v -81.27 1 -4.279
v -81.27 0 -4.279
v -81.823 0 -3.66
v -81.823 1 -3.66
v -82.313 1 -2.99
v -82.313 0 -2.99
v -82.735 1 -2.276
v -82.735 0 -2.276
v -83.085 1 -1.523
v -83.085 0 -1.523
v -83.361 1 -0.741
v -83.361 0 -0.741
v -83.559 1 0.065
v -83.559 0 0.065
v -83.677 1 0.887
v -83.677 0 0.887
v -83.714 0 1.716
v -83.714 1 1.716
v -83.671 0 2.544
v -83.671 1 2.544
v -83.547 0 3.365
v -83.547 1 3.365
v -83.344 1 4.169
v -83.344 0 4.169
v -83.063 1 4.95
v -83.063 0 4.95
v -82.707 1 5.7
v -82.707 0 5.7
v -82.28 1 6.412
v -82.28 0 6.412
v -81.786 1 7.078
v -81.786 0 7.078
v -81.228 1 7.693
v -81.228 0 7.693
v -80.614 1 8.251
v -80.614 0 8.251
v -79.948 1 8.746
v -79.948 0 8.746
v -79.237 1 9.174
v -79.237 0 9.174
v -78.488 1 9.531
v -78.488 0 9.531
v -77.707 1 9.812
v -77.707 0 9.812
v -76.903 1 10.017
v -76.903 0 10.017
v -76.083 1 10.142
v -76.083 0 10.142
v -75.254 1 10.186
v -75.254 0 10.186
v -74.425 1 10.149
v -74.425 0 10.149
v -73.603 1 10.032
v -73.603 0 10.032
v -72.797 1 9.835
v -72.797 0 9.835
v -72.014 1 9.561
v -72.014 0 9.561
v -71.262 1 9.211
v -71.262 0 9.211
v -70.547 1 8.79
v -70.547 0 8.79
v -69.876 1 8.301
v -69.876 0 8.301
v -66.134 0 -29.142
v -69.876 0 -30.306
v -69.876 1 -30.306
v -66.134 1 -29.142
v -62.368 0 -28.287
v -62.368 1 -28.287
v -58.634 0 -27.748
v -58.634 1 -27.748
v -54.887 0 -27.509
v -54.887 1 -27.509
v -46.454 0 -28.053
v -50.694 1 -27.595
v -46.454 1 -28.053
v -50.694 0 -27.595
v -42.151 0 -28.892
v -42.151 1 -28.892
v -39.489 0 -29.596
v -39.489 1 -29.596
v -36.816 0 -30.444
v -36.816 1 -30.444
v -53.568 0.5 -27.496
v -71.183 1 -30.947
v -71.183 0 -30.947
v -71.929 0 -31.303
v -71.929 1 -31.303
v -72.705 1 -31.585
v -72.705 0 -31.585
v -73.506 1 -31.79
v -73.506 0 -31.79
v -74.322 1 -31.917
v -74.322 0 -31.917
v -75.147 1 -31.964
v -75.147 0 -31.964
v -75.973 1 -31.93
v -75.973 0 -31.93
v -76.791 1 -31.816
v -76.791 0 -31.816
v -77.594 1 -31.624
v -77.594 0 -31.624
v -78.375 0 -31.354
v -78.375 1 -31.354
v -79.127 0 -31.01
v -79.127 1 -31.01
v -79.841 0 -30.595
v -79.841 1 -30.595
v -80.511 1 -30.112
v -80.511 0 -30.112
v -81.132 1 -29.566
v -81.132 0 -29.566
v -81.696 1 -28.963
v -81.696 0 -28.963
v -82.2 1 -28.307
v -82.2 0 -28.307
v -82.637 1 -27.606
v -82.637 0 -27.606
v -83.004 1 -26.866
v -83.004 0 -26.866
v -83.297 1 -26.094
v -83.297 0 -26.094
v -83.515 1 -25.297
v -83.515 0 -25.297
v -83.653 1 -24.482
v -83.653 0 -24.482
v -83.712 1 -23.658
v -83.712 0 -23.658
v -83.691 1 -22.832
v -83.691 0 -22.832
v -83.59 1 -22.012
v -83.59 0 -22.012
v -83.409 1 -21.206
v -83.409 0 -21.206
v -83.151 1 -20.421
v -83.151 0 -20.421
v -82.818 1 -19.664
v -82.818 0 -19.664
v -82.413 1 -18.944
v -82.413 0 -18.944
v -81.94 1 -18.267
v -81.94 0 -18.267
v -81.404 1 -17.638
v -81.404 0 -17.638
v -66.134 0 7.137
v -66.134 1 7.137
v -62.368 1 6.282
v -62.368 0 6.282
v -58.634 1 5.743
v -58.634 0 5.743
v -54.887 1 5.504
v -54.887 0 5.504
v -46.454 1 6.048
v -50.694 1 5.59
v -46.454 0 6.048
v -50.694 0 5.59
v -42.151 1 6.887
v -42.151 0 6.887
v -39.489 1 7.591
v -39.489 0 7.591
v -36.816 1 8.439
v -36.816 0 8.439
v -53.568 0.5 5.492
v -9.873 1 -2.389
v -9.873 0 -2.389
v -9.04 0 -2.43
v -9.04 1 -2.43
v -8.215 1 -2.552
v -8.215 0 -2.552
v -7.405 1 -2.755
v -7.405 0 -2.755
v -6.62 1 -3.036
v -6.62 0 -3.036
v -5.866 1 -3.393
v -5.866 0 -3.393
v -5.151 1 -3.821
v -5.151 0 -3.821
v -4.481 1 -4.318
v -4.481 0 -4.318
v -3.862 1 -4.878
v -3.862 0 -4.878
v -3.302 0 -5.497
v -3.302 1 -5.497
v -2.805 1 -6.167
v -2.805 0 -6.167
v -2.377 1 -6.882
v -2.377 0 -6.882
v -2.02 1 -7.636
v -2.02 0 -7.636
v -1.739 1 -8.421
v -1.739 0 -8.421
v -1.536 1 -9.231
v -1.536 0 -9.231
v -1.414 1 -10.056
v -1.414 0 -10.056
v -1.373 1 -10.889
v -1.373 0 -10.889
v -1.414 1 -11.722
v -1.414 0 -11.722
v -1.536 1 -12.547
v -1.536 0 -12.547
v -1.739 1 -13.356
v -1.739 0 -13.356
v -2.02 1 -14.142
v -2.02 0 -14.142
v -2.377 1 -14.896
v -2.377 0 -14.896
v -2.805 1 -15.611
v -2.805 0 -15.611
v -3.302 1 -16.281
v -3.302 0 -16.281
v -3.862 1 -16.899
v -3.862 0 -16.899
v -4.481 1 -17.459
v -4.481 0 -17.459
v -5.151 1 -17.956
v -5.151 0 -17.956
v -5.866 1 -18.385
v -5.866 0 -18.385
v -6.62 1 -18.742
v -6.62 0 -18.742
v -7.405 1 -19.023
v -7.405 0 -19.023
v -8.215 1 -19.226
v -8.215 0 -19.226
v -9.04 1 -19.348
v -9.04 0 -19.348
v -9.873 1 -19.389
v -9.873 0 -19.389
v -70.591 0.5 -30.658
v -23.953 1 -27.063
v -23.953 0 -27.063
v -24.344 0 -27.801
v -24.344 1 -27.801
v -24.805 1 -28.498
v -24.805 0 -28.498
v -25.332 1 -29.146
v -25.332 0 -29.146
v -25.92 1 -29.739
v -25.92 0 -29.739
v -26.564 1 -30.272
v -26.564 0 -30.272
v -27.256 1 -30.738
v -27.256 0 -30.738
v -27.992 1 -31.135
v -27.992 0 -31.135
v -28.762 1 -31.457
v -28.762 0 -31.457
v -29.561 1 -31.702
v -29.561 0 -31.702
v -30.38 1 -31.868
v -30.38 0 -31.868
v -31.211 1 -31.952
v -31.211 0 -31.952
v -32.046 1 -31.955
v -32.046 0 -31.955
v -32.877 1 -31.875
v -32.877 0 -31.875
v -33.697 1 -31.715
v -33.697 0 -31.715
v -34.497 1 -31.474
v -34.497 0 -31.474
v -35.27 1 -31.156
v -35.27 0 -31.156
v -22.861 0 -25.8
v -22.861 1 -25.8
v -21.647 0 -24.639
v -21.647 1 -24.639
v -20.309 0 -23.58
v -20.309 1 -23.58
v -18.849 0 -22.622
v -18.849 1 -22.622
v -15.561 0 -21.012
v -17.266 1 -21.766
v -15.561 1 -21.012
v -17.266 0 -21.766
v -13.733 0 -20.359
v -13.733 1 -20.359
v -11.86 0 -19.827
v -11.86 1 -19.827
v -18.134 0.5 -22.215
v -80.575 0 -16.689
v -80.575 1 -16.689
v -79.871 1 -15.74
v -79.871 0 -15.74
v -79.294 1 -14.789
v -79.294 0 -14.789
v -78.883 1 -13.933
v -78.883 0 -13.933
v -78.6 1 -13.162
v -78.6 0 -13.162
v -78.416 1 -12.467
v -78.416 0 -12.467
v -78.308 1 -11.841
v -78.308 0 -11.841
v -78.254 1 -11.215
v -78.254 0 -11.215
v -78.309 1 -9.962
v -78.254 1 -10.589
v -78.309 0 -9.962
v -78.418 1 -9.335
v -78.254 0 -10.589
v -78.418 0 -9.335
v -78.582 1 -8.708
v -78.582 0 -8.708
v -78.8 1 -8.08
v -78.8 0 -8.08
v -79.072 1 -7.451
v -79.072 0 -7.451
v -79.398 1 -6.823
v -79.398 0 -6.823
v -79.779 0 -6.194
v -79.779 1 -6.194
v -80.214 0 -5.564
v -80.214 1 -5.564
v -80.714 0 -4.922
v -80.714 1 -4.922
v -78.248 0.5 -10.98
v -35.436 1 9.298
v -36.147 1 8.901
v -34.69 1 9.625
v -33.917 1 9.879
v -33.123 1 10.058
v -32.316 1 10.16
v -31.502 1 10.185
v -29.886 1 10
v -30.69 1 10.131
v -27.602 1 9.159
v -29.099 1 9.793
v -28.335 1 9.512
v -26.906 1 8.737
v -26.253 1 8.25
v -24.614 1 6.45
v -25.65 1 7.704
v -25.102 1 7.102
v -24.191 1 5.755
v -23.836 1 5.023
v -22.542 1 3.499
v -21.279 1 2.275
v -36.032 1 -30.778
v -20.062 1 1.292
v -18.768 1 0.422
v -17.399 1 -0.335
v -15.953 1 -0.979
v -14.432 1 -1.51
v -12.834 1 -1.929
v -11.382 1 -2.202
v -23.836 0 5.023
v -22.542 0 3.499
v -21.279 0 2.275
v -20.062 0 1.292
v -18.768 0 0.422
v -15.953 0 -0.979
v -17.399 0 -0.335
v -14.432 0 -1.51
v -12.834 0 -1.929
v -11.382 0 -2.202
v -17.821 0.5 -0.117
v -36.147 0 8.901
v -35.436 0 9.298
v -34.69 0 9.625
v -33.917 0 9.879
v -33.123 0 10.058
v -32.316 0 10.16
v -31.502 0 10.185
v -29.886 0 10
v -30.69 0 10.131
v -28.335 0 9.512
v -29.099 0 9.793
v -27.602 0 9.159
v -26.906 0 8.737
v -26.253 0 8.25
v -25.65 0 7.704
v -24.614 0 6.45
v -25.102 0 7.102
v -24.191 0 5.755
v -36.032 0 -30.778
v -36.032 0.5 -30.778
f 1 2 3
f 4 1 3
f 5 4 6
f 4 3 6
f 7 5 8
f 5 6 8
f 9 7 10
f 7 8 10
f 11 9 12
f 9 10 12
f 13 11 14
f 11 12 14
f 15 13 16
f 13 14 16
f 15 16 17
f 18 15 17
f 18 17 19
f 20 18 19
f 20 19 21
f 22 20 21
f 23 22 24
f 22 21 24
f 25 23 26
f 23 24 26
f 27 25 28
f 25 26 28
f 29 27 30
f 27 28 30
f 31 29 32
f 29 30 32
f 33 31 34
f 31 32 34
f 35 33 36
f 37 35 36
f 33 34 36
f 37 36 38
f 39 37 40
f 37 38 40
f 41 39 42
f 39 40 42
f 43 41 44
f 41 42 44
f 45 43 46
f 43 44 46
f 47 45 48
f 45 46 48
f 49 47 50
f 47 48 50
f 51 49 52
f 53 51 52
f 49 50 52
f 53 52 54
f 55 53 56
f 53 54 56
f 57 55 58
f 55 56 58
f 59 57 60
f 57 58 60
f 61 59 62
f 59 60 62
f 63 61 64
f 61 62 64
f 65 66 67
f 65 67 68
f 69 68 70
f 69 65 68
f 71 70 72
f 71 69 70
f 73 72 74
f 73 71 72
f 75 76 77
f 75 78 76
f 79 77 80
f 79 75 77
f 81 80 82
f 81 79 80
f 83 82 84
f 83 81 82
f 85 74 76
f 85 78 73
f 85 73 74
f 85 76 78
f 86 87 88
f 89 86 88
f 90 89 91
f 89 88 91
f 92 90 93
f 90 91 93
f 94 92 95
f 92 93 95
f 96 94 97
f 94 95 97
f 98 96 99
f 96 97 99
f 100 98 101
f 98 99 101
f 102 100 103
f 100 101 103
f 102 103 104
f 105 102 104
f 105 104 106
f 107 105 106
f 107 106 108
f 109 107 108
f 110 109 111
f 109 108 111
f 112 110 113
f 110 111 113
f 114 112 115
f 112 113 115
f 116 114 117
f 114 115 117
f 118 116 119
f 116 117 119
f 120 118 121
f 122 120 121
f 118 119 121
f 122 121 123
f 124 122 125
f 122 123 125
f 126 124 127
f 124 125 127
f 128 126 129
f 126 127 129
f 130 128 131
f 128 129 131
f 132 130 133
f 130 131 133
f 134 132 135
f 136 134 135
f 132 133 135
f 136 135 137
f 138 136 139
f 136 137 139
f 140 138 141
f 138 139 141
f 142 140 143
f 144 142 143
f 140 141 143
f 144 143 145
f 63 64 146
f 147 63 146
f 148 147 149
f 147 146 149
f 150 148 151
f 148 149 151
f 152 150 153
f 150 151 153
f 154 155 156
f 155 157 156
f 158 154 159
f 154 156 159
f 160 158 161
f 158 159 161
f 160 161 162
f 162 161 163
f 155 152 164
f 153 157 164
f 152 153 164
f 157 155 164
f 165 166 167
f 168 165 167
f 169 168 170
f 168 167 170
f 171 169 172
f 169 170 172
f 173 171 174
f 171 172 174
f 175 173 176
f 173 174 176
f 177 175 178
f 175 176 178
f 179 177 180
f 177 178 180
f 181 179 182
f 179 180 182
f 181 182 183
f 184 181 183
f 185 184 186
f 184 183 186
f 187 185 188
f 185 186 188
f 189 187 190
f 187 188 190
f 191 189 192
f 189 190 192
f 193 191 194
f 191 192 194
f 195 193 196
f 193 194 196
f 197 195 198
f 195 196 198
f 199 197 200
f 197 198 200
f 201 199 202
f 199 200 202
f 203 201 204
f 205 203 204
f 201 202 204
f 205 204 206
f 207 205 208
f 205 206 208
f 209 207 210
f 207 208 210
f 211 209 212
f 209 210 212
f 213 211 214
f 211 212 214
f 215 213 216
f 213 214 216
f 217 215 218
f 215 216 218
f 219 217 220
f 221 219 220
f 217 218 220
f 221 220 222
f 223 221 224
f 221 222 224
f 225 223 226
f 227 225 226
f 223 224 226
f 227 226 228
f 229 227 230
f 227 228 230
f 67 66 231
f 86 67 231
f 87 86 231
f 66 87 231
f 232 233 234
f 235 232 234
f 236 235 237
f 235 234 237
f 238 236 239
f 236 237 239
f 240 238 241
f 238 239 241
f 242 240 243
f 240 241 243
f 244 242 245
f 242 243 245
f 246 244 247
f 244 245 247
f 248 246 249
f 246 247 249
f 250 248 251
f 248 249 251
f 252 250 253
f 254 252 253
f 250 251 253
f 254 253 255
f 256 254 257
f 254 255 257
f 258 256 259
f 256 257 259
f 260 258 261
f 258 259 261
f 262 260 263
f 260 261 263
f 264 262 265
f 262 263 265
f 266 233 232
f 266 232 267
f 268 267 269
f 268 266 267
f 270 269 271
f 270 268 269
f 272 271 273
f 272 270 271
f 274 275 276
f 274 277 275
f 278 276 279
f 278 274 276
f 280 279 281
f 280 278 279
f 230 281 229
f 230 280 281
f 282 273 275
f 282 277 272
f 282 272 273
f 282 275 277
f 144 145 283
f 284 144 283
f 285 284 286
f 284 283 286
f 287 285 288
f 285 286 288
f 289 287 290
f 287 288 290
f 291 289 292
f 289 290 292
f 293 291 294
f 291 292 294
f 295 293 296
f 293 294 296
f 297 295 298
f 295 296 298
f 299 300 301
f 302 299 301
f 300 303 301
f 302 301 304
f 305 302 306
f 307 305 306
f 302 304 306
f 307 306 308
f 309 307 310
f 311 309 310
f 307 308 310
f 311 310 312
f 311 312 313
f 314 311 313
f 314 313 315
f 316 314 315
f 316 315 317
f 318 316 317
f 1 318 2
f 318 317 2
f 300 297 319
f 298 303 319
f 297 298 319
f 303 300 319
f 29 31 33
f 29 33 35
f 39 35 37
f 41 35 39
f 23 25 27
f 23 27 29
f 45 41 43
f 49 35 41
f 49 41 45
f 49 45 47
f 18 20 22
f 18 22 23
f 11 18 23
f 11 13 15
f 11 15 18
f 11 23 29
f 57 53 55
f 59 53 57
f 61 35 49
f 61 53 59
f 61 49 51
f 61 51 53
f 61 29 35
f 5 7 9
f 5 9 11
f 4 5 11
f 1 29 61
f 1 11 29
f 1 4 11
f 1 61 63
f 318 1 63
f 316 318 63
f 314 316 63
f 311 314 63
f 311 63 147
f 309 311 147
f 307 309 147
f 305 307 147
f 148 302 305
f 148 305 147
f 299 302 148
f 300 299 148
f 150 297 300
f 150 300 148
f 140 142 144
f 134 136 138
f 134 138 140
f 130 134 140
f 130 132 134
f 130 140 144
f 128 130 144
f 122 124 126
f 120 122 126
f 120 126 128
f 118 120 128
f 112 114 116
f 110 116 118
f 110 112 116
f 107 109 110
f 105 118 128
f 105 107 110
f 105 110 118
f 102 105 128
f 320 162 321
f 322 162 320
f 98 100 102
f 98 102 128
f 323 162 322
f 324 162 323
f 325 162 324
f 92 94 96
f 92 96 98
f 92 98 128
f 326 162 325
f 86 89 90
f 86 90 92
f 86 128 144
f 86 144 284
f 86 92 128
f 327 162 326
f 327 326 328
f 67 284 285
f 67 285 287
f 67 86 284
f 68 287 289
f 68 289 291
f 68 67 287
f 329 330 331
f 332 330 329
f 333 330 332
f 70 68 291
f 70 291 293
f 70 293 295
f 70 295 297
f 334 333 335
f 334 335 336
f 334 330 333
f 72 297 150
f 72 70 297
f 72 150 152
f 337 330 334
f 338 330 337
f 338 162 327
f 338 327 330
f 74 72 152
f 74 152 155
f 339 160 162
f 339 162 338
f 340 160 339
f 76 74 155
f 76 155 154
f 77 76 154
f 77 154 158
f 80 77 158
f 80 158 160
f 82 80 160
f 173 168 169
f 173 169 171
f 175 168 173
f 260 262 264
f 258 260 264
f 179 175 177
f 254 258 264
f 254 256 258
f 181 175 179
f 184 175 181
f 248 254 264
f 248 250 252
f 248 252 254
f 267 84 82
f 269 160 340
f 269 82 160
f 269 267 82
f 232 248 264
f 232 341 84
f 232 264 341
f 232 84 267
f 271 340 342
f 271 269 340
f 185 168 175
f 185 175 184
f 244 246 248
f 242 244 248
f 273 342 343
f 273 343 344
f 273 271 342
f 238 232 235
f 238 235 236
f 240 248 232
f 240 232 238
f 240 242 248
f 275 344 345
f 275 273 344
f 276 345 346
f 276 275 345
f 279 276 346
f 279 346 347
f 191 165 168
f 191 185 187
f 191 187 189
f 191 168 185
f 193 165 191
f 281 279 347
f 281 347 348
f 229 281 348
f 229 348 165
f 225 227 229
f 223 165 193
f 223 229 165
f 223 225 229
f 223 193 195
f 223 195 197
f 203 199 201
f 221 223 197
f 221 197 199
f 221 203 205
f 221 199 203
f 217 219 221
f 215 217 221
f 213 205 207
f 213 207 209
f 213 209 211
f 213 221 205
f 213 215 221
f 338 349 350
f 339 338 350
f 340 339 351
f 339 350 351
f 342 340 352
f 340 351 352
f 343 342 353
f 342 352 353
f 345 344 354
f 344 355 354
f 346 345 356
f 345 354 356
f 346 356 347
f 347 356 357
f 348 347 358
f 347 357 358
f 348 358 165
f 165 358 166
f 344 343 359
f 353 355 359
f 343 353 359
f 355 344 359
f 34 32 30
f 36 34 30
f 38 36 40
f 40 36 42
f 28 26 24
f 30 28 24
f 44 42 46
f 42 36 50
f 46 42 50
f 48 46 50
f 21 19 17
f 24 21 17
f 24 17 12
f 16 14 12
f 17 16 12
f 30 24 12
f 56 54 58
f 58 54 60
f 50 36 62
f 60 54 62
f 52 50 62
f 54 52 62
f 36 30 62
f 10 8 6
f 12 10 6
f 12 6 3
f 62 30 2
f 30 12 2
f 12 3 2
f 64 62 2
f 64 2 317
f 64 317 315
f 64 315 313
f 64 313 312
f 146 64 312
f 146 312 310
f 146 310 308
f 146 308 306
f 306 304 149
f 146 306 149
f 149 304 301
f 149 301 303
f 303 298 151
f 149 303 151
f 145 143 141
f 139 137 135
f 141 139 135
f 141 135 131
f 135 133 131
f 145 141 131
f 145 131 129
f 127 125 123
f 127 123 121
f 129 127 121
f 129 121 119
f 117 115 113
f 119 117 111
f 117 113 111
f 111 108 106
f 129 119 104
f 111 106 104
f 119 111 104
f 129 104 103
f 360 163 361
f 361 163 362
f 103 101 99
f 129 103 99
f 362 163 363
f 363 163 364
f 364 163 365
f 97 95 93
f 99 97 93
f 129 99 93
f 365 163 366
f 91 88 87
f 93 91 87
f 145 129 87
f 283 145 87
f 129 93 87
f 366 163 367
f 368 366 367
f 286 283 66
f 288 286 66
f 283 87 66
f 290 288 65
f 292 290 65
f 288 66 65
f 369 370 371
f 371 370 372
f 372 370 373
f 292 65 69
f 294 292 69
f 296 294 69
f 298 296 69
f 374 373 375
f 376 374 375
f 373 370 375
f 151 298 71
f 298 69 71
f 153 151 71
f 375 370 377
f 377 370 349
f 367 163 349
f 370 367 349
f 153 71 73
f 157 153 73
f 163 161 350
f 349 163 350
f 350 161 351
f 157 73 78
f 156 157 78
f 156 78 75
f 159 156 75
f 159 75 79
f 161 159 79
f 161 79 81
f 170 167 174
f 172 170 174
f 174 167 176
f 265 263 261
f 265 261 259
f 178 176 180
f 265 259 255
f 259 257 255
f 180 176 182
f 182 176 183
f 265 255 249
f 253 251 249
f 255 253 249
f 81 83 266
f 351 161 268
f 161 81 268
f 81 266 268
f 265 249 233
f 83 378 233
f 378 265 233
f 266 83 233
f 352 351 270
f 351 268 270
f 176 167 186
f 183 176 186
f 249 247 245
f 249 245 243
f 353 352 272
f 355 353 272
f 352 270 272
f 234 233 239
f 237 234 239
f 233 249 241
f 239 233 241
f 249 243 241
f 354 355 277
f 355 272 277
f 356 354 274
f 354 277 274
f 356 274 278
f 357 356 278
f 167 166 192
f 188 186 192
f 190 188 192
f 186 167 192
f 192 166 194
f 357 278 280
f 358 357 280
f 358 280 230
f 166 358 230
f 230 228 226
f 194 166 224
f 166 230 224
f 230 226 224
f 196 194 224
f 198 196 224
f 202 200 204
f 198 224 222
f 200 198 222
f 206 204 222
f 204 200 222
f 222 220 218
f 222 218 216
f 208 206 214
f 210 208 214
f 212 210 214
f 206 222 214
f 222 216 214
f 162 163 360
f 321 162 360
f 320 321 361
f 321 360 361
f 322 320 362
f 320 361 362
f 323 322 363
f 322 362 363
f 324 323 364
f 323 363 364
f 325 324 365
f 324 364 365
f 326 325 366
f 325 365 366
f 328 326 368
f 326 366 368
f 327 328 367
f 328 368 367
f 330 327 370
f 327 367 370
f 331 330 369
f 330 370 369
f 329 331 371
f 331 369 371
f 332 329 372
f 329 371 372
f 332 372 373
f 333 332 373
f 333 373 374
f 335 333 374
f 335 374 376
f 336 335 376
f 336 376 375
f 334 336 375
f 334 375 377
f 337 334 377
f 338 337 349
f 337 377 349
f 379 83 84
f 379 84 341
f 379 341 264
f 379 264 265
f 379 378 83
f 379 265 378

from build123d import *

# Parameters (mm, degrees)
BOSS_EXTRUDE1_DEPTH = 1


with BuildPart() as part:
    # Sketch2 → Boss-Extrude1 (new body)
    with BuildSketch(Plane(origin=(0, 0, 0), x_dir=(1, 0, 0), z_dir=(0, 1, 0))):
        with BuildLine():
            ThreePointArc((-71.182941142, 30.946937821), (-81.955848591, 28.641140782), (-81.404021294, 17.638062962))
            add(Edge.make_bspline(
                [(-81.404021294, 17.638062962), (-75.158372689, 11.002477672), (-81.269993216, 4.278841868)],
                knots=[0, 0, 0, 1, 1, 1], degree=2))
            ThreePointArc((-81.269993216, 4.278841868), (-81.514487403, -7.392298406), (-69.876184196, -8.300698737))
            add(Edge.make_bspline(
                [(-69.876184196, -8.300698737), (-53.789538282, -2.613370983), (-36.816188666, -8.438615516)],
                knots=[0, 0, 0, 1, 1, 1], degree=2))
            ThreePointArc((-36.816188666, -8.438615516), (-29.490215818, -9.906272337), (-23.835645267, -5.022654149))
            add(Edge.make_bspline(
                [(-23.835645267, -5.022654149), (-18.788732993, 1.551574281), (-9.872887068, 2.388856726)],
                knots=[0, 0, 0, 1, 1, 1], degree=2))
            ThreePointArc((-9.872887068, 2.388856726), (-1.372887068, 10.888856726), (-9.872887068, 19.388856726))
            add(Edge.make_bspline(
                [(-23.953041345, 27.063033935), (-19.355695248, 21.203284709), (-9.872887068, 19.388856726)],
                knots=[0, 0, 0, 1, 1, 1], degree=2))
            ThreePointArc((-23.953041345, 27.063033935), (-28.762275622, 31.45705694), (-35.26963246, 31.156258864))
            add(Edge.make_bspline(
                [(-36.816188666, 30.443570859), (-36.021895681, 30.755550467), (-35.26963246, 31.156258864)],
                knots=[0, 0, 0, 1, 1, 1], degree=2))
            add(Edge.make_bspline(
                [(-69.876184196, 30.30565408), (-53.789538282, 24.618326327), (-36.816188666, 30.443570859)],
                knots=[0, 0, 0, 1, 1, 1], degree=2))
            add(Edge.make_bspline(
                [(-69.876184196, 30.30565408), (-70.653281817, 30.689868104), (-71.182941142, 30.946937821)],
                knots=[0, 0, 0, 1, 1, 1], degree=2))
        make_face()
    extrude(amount=BOSS_EXTRUDE1_DEPTH)


solid = part.part
